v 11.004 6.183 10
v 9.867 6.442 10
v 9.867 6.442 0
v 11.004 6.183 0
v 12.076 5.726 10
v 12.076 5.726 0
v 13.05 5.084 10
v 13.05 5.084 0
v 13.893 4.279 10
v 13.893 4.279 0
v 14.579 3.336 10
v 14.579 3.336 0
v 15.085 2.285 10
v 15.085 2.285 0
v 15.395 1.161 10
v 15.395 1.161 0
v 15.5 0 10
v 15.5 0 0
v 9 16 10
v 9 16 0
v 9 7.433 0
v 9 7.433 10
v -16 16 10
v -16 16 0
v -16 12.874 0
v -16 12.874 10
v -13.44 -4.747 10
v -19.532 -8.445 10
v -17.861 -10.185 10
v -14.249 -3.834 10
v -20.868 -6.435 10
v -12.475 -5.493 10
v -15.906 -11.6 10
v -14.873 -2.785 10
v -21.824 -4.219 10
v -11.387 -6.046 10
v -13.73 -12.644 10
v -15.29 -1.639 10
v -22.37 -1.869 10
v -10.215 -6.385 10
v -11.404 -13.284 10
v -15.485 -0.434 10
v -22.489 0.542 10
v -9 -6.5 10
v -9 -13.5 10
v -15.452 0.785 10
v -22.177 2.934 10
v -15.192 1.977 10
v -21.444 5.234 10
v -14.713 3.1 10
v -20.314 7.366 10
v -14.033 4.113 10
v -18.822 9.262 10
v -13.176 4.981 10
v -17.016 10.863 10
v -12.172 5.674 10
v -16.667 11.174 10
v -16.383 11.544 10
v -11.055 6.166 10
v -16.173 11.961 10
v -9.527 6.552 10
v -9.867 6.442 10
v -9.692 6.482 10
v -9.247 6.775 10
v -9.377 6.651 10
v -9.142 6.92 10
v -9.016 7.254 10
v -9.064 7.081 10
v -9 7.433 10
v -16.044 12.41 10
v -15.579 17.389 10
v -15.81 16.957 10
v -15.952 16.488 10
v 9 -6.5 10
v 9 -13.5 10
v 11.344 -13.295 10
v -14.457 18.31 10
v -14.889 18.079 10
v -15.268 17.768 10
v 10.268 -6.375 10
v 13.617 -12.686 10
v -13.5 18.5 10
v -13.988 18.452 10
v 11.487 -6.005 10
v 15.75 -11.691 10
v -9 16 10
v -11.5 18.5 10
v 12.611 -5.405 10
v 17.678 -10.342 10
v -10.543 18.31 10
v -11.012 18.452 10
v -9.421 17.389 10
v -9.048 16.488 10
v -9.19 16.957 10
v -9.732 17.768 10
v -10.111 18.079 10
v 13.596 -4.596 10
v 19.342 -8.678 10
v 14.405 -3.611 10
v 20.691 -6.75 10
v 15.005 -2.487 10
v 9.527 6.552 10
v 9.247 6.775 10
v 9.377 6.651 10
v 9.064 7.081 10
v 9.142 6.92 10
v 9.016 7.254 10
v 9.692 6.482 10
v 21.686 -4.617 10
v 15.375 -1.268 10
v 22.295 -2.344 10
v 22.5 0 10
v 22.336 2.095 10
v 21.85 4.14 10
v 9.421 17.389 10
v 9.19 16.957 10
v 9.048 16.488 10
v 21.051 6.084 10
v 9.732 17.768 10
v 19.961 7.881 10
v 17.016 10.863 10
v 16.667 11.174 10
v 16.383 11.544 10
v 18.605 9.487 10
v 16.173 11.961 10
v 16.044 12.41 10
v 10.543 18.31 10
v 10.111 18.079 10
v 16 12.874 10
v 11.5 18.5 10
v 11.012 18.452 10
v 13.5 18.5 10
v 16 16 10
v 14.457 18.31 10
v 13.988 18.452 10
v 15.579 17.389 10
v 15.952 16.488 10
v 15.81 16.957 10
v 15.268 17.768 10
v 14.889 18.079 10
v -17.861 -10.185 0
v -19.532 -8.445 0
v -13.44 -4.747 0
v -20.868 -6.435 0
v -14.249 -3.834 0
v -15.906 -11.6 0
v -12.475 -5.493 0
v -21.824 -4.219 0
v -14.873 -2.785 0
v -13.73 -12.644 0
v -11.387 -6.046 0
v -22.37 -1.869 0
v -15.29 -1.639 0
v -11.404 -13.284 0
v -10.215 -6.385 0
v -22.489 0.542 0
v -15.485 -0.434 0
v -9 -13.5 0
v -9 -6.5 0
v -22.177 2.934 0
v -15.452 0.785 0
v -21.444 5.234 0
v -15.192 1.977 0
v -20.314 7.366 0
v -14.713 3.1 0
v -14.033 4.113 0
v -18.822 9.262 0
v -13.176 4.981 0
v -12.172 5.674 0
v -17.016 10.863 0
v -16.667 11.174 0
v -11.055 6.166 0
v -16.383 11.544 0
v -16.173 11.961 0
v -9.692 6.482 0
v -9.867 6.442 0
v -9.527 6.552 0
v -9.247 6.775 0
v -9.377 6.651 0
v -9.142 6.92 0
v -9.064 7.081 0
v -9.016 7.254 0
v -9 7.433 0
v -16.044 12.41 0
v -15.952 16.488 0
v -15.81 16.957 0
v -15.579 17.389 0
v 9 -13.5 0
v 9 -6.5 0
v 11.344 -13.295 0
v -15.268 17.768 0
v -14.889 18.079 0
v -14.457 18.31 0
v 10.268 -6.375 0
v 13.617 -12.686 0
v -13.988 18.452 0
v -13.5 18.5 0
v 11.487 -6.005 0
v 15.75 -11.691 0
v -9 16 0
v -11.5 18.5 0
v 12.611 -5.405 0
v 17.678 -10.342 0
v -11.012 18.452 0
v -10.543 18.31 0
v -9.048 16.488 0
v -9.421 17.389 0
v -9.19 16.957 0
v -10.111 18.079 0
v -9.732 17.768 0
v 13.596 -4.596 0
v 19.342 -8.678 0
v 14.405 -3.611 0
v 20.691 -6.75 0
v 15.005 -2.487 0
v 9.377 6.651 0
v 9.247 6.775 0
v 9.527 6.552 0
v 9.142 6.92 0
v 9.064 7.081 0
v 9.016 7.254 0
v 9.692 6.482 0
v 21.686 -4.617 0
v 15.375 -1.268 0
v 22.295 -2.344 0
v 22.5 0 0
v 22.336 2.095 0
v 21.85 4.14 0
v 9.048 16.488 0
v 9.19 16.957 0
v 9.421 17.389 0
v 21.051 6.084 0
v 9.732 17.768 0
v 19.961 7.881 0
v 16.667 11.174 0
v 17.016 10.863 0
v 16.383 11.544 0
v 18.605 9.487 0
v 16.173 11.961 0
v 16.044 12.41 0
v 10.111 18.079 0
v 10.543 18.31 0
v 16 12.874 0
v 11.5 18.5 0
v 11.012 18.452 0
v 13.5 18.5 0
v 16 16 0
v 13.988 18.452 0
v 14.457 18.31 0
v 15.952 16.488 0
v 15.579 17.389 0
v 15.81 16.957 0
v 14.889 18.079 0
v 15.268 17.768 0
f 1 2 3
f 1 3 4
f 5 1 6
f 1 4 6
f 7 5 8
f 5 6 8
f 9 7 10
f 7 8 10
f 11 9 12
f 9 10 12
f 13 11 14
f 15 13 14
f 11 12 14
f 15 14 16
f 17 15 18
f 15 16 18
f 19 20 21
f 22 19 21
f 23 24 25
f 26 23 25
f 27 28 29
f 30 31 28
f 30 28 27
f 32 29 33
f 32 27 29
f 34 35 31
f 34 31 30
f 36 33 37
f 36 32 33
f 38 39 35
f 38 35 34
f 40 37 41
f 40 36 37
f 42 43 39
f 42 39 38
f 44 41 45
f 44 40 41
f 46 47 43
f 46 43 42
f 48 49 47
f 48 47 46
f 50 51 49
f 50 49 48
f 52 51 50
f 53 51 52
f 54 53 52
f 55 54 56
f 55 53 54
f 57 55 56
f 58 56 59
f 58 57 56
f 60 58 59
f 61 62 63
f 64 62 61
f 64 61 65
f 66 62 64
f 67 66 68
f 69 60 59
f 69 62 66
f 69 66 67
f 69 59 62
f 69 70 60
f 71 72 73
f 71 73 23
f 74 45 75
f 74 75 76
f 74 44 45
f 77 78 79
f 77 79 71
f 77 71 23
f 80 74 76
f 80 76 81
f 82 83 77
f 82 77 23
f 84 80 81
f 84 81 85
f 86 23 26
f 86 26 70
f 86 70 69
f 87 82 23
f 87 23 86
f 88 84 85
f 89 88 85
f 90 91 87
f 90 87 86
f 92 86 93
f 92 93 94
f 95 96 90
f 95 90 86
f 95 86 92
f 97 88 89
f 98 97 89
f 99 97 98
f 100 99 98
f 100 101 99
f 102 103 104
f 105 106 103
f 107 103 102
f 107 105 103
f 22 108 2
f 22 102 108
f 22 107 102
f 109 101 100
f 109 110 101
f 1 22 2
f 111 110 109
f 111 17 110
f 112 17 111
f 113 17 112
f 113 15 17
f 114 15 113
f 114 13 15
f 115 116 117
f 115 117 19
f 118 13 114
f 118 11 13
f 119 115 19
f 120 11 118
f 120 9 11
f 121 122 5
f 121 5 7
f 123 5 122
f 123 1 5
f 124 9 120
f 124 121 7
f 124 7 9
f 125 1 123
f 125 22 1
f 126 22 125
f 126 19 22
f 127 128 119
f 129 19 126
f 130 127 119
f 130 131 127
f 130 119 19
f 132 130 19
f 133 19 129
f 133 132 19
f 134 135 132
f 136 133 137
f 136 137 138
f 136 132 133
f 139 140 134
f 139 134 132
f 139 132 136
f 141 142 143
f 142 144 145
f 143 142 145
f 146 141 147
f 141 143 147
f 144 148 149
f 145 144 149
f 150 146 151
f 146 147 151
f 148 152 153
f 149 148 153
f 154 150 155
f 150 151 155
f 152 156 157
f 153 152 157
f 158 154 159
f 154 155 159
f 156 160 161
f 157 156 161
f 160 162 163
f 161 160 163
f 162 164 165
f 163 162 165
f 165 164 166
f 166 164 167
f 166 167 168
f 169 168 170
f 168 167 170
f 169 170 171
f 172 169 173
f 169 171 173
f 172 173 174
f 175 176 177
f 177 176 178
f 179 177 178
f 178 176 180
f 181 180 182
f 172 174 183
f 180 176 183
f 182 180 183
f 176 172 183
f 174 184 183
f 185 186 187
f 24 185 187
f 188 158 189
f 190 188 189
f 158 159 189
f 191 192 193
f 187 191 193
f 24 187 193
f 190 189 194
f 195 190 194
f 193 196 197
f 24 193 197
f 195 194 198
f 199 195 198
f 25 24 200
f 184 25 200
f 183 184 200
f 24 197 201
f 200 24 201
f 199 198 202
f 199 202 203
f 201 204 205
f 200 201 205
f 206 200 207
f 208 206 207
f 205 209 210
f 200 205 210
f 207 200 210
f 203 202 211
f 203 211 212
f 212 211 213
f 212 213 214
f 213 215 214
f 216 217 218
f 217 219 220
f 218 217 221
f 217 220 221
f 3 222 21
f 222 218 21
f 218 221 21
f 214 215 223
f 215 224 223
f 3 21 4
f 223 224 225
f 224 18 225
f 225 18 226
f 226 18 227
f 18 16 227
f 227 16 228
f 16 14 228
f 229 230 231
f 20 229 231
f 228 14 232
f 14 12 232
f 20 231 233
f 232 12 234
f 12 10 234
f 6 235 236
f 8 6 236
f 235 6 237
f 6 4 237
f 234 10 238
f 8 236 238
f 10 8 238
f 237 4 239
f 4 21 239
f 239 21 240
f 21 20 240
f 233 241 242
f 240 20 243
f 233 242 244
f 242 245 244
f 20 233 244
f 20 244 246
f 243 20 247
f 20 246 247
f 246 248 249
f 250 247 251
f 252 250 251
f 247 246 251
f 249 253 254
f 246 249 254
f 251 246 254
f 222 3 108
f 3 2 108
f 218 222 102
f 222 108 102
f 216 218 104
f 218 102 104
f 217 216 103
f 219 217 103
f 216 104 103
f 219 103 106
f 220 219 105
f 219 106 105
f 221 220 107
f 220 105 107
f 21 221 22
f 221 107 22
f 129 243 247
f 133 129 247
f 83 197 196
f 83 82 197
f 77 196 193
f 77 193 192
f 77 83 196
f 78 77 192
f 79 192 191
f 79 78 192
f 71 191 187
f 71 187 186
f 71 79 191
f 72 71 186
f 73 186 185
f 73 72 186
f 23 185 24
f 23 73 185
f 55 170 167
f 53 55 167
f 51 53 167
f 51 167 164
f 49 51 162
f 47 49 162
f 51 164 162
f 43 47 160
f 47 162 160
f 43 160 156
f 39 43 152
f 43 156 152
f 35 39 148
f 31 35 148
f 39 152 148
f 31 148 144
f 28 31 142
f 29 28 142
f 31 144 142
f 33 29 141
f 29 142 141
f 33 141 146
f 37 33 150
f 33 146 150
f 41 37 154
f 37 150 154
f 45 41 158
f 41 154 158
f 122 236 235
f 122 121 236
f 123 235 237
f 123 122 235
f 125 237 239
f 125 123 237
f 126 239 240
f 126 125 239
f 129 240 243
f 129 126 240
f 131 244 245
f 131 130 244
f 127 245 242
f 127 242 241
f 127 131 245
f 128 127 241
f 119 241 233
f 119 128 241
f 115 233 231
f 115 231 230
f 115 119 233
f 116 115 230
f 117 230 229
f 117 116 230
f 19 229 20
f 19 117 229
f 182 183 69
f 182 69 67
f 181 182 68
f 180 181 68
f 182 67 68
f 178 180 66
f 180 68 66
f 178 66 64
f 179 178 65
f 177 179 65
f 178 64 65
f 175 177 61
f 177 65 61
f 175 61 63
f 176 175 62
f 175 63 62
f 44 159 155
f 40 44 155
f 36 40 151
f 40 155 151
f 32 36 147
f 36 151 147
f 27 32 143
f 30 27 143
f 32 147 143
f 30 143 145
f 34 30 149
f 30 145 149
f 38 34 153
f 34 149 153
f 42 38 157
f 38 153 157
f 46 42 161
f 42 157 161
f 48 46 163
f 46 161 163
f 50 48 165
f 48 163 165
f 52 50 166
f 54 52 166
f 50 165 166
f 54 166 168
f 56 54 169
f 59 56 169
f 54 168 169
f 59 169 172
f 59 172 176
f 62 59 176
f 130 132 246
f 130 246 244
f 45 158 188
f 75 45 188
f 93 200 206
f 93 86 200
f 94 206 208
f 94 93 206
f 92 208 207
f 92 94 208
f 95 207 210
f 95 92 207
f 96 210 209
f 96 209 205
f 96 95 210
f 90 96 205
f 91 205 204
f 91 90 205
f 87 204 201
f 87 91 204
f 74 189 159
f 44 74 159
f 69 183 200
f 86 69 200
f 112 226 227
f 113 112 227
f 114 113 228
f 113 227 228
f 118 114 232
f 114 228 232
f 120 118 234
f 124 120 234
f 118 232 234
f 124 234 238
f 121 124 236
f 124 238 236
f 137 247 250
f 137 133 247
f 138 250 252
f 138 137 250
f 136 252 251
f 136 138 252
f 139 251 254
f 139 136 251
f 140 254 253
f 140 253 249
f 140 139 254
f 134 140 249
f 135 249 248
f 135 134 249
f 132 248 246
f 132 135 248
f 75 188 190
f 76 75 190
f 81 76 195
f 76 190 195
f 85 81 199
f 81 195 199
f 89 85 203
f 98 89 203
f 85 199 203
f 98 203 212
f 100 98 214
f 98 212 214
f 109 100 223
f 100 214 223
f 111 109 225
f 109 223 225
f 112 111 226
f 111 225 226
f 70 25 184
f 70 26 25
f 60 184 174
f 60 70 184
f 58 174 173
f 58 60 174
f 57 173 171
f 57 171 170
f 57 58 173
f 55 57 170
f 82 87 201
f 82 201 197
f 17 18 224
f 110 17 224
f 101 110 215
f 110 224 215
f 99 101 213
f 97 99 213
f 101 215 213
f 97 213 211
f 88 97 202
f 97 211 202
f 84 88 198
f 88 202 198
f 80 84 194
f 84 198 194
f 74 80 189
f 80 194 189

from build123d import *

# Parameters (mm, degrees)
F1_DEPTH = 10
F2_R     = 2.5
F3_R     = 1


with BuildPart() as f1:
    # F0 (on Top) → F1 (new body)
    with BuildSketch(Plane.XY):
        with BuildLine():
            ThreePointArc((15.5, 0), (13.5961940777, -4.5961940777), (9, -6.5))
            Line((9, -6.5), (2.8321595662, -6.5))
            ThreePointArc((2.8321595662, -6.5), (1.5672713544, -8.4013556122), (0, -10.0623058987))
            ThreePointArc((0, -10.0623058987), (4.1829017881, -12.611326846), (9, -13.5))
            ThreePointArc((9, -13.5), (18.545941546, -9.545941546), (22.5, 0))
            ThreePointArc((22.5, 0), (20.763290356, 6.6238206497), (16, 11.5433963806))
            ThreePointArc((16, 11.5433963806), (12.634153881, 13.0016508786), (9, 13.5))
            Line((9, 13.5), (9, 6.5))
            ThreePointArc((9, 6.5), (13.5961940777, 4.5961940777), (15.5, 0))
        make_face()
        with BuildLine():
            ThreePointArc((0, -10.0623058987), (1.5672713544, -8.4013556122), (2.8321595662, -6.5))
            Line((2.8321595662, -6.5), (-2.8321595662, -6.5))
            ThreePointArc((-2.8321595662, -6.5), (-1.5672713544, -8.4013556122), (0, -10.0623058987))
        make_face()
        with BuildLine():
            Line((9, 18.5), (9, 13.5))
            ThreePointArc((9, 13.5), (12.634153881, 13.0016508786), (16, 11.5433963806))
            Line((16, 11.5433963806), (16, 18.5))
            Line((16, 18.5), (9, 18.5))
        make_face()
        with BuildLine():
            ThreePointArc((0, -10.0623058987), (-1.5672713544, -8.4013556122), (-2.8321595662, -6.5))
            Line((-2.8321595662, -6.5), (-9, -6.5))
            ThreePointArc((-9, -6.5), (-15.5, 0), (-9, 6.5))
            Line((-9, 6.5), (-9, 13.5))
            ThreePointArc((-9, 13.5), (-12.634153881, 13.0016508786), (-16, 11.5433963806))
            ThreePointArc((-16, 11.5433963806), (-22.0016508786, -3.634153881), (-9, -13.5))
            ThreePointArc((-9, -13.5), (-4.1829017881, -12.611326846), (0, -10.0623058987))
        make_face()
        with BuildLine():
            ThreePointArc((9, -13.5), (4.1829017881, -12.611326846), (0, -10.0623058987))
            ThreePointArc((0, -10.0623058987), (-4.1829017881, -12.611326846), (-9, -13.5))
            Line((-9, -13.5), (9, -13.5))
        make_face()
        with BuildLine():
            ThreePointArc((-16, 11.5433963806), (-12.634153881, 13.0016508786), (-9, 13.5))
            Line((-9, 13.5), (-9, 18.5))
            Line((-9, 18.5), (-16, 18.5))
            Line((-16, 18.5), (-16, 11.5433963806))
        make_face()
    extrude(amount=F1_DEPTH)

    # F2
    f2_edges = [f1.edges().sort_by_distance(p)[0] for p in [
        (16, 18.5, 5),
        (9, 18.5, 5),
        (-9, 18.5, 5),
        (-16, 18.5, 5),
        (16, 11.543396, 5),
        (-16, 11.543396, 5),
    ]]
    fillet(f2_edges, radius=F2_R)

    # F3
    f3_edges = [f1.edges().sort_by_distance(p)[0] for p in [
        (-9, -6.5, 5),
        (9, -6.5, 5),
        (-9, 6.5, 5),
        (9, 6.5, 5),
    ]]
    fillet(f3_edges, radius=F3_R)


solid = f1.part
